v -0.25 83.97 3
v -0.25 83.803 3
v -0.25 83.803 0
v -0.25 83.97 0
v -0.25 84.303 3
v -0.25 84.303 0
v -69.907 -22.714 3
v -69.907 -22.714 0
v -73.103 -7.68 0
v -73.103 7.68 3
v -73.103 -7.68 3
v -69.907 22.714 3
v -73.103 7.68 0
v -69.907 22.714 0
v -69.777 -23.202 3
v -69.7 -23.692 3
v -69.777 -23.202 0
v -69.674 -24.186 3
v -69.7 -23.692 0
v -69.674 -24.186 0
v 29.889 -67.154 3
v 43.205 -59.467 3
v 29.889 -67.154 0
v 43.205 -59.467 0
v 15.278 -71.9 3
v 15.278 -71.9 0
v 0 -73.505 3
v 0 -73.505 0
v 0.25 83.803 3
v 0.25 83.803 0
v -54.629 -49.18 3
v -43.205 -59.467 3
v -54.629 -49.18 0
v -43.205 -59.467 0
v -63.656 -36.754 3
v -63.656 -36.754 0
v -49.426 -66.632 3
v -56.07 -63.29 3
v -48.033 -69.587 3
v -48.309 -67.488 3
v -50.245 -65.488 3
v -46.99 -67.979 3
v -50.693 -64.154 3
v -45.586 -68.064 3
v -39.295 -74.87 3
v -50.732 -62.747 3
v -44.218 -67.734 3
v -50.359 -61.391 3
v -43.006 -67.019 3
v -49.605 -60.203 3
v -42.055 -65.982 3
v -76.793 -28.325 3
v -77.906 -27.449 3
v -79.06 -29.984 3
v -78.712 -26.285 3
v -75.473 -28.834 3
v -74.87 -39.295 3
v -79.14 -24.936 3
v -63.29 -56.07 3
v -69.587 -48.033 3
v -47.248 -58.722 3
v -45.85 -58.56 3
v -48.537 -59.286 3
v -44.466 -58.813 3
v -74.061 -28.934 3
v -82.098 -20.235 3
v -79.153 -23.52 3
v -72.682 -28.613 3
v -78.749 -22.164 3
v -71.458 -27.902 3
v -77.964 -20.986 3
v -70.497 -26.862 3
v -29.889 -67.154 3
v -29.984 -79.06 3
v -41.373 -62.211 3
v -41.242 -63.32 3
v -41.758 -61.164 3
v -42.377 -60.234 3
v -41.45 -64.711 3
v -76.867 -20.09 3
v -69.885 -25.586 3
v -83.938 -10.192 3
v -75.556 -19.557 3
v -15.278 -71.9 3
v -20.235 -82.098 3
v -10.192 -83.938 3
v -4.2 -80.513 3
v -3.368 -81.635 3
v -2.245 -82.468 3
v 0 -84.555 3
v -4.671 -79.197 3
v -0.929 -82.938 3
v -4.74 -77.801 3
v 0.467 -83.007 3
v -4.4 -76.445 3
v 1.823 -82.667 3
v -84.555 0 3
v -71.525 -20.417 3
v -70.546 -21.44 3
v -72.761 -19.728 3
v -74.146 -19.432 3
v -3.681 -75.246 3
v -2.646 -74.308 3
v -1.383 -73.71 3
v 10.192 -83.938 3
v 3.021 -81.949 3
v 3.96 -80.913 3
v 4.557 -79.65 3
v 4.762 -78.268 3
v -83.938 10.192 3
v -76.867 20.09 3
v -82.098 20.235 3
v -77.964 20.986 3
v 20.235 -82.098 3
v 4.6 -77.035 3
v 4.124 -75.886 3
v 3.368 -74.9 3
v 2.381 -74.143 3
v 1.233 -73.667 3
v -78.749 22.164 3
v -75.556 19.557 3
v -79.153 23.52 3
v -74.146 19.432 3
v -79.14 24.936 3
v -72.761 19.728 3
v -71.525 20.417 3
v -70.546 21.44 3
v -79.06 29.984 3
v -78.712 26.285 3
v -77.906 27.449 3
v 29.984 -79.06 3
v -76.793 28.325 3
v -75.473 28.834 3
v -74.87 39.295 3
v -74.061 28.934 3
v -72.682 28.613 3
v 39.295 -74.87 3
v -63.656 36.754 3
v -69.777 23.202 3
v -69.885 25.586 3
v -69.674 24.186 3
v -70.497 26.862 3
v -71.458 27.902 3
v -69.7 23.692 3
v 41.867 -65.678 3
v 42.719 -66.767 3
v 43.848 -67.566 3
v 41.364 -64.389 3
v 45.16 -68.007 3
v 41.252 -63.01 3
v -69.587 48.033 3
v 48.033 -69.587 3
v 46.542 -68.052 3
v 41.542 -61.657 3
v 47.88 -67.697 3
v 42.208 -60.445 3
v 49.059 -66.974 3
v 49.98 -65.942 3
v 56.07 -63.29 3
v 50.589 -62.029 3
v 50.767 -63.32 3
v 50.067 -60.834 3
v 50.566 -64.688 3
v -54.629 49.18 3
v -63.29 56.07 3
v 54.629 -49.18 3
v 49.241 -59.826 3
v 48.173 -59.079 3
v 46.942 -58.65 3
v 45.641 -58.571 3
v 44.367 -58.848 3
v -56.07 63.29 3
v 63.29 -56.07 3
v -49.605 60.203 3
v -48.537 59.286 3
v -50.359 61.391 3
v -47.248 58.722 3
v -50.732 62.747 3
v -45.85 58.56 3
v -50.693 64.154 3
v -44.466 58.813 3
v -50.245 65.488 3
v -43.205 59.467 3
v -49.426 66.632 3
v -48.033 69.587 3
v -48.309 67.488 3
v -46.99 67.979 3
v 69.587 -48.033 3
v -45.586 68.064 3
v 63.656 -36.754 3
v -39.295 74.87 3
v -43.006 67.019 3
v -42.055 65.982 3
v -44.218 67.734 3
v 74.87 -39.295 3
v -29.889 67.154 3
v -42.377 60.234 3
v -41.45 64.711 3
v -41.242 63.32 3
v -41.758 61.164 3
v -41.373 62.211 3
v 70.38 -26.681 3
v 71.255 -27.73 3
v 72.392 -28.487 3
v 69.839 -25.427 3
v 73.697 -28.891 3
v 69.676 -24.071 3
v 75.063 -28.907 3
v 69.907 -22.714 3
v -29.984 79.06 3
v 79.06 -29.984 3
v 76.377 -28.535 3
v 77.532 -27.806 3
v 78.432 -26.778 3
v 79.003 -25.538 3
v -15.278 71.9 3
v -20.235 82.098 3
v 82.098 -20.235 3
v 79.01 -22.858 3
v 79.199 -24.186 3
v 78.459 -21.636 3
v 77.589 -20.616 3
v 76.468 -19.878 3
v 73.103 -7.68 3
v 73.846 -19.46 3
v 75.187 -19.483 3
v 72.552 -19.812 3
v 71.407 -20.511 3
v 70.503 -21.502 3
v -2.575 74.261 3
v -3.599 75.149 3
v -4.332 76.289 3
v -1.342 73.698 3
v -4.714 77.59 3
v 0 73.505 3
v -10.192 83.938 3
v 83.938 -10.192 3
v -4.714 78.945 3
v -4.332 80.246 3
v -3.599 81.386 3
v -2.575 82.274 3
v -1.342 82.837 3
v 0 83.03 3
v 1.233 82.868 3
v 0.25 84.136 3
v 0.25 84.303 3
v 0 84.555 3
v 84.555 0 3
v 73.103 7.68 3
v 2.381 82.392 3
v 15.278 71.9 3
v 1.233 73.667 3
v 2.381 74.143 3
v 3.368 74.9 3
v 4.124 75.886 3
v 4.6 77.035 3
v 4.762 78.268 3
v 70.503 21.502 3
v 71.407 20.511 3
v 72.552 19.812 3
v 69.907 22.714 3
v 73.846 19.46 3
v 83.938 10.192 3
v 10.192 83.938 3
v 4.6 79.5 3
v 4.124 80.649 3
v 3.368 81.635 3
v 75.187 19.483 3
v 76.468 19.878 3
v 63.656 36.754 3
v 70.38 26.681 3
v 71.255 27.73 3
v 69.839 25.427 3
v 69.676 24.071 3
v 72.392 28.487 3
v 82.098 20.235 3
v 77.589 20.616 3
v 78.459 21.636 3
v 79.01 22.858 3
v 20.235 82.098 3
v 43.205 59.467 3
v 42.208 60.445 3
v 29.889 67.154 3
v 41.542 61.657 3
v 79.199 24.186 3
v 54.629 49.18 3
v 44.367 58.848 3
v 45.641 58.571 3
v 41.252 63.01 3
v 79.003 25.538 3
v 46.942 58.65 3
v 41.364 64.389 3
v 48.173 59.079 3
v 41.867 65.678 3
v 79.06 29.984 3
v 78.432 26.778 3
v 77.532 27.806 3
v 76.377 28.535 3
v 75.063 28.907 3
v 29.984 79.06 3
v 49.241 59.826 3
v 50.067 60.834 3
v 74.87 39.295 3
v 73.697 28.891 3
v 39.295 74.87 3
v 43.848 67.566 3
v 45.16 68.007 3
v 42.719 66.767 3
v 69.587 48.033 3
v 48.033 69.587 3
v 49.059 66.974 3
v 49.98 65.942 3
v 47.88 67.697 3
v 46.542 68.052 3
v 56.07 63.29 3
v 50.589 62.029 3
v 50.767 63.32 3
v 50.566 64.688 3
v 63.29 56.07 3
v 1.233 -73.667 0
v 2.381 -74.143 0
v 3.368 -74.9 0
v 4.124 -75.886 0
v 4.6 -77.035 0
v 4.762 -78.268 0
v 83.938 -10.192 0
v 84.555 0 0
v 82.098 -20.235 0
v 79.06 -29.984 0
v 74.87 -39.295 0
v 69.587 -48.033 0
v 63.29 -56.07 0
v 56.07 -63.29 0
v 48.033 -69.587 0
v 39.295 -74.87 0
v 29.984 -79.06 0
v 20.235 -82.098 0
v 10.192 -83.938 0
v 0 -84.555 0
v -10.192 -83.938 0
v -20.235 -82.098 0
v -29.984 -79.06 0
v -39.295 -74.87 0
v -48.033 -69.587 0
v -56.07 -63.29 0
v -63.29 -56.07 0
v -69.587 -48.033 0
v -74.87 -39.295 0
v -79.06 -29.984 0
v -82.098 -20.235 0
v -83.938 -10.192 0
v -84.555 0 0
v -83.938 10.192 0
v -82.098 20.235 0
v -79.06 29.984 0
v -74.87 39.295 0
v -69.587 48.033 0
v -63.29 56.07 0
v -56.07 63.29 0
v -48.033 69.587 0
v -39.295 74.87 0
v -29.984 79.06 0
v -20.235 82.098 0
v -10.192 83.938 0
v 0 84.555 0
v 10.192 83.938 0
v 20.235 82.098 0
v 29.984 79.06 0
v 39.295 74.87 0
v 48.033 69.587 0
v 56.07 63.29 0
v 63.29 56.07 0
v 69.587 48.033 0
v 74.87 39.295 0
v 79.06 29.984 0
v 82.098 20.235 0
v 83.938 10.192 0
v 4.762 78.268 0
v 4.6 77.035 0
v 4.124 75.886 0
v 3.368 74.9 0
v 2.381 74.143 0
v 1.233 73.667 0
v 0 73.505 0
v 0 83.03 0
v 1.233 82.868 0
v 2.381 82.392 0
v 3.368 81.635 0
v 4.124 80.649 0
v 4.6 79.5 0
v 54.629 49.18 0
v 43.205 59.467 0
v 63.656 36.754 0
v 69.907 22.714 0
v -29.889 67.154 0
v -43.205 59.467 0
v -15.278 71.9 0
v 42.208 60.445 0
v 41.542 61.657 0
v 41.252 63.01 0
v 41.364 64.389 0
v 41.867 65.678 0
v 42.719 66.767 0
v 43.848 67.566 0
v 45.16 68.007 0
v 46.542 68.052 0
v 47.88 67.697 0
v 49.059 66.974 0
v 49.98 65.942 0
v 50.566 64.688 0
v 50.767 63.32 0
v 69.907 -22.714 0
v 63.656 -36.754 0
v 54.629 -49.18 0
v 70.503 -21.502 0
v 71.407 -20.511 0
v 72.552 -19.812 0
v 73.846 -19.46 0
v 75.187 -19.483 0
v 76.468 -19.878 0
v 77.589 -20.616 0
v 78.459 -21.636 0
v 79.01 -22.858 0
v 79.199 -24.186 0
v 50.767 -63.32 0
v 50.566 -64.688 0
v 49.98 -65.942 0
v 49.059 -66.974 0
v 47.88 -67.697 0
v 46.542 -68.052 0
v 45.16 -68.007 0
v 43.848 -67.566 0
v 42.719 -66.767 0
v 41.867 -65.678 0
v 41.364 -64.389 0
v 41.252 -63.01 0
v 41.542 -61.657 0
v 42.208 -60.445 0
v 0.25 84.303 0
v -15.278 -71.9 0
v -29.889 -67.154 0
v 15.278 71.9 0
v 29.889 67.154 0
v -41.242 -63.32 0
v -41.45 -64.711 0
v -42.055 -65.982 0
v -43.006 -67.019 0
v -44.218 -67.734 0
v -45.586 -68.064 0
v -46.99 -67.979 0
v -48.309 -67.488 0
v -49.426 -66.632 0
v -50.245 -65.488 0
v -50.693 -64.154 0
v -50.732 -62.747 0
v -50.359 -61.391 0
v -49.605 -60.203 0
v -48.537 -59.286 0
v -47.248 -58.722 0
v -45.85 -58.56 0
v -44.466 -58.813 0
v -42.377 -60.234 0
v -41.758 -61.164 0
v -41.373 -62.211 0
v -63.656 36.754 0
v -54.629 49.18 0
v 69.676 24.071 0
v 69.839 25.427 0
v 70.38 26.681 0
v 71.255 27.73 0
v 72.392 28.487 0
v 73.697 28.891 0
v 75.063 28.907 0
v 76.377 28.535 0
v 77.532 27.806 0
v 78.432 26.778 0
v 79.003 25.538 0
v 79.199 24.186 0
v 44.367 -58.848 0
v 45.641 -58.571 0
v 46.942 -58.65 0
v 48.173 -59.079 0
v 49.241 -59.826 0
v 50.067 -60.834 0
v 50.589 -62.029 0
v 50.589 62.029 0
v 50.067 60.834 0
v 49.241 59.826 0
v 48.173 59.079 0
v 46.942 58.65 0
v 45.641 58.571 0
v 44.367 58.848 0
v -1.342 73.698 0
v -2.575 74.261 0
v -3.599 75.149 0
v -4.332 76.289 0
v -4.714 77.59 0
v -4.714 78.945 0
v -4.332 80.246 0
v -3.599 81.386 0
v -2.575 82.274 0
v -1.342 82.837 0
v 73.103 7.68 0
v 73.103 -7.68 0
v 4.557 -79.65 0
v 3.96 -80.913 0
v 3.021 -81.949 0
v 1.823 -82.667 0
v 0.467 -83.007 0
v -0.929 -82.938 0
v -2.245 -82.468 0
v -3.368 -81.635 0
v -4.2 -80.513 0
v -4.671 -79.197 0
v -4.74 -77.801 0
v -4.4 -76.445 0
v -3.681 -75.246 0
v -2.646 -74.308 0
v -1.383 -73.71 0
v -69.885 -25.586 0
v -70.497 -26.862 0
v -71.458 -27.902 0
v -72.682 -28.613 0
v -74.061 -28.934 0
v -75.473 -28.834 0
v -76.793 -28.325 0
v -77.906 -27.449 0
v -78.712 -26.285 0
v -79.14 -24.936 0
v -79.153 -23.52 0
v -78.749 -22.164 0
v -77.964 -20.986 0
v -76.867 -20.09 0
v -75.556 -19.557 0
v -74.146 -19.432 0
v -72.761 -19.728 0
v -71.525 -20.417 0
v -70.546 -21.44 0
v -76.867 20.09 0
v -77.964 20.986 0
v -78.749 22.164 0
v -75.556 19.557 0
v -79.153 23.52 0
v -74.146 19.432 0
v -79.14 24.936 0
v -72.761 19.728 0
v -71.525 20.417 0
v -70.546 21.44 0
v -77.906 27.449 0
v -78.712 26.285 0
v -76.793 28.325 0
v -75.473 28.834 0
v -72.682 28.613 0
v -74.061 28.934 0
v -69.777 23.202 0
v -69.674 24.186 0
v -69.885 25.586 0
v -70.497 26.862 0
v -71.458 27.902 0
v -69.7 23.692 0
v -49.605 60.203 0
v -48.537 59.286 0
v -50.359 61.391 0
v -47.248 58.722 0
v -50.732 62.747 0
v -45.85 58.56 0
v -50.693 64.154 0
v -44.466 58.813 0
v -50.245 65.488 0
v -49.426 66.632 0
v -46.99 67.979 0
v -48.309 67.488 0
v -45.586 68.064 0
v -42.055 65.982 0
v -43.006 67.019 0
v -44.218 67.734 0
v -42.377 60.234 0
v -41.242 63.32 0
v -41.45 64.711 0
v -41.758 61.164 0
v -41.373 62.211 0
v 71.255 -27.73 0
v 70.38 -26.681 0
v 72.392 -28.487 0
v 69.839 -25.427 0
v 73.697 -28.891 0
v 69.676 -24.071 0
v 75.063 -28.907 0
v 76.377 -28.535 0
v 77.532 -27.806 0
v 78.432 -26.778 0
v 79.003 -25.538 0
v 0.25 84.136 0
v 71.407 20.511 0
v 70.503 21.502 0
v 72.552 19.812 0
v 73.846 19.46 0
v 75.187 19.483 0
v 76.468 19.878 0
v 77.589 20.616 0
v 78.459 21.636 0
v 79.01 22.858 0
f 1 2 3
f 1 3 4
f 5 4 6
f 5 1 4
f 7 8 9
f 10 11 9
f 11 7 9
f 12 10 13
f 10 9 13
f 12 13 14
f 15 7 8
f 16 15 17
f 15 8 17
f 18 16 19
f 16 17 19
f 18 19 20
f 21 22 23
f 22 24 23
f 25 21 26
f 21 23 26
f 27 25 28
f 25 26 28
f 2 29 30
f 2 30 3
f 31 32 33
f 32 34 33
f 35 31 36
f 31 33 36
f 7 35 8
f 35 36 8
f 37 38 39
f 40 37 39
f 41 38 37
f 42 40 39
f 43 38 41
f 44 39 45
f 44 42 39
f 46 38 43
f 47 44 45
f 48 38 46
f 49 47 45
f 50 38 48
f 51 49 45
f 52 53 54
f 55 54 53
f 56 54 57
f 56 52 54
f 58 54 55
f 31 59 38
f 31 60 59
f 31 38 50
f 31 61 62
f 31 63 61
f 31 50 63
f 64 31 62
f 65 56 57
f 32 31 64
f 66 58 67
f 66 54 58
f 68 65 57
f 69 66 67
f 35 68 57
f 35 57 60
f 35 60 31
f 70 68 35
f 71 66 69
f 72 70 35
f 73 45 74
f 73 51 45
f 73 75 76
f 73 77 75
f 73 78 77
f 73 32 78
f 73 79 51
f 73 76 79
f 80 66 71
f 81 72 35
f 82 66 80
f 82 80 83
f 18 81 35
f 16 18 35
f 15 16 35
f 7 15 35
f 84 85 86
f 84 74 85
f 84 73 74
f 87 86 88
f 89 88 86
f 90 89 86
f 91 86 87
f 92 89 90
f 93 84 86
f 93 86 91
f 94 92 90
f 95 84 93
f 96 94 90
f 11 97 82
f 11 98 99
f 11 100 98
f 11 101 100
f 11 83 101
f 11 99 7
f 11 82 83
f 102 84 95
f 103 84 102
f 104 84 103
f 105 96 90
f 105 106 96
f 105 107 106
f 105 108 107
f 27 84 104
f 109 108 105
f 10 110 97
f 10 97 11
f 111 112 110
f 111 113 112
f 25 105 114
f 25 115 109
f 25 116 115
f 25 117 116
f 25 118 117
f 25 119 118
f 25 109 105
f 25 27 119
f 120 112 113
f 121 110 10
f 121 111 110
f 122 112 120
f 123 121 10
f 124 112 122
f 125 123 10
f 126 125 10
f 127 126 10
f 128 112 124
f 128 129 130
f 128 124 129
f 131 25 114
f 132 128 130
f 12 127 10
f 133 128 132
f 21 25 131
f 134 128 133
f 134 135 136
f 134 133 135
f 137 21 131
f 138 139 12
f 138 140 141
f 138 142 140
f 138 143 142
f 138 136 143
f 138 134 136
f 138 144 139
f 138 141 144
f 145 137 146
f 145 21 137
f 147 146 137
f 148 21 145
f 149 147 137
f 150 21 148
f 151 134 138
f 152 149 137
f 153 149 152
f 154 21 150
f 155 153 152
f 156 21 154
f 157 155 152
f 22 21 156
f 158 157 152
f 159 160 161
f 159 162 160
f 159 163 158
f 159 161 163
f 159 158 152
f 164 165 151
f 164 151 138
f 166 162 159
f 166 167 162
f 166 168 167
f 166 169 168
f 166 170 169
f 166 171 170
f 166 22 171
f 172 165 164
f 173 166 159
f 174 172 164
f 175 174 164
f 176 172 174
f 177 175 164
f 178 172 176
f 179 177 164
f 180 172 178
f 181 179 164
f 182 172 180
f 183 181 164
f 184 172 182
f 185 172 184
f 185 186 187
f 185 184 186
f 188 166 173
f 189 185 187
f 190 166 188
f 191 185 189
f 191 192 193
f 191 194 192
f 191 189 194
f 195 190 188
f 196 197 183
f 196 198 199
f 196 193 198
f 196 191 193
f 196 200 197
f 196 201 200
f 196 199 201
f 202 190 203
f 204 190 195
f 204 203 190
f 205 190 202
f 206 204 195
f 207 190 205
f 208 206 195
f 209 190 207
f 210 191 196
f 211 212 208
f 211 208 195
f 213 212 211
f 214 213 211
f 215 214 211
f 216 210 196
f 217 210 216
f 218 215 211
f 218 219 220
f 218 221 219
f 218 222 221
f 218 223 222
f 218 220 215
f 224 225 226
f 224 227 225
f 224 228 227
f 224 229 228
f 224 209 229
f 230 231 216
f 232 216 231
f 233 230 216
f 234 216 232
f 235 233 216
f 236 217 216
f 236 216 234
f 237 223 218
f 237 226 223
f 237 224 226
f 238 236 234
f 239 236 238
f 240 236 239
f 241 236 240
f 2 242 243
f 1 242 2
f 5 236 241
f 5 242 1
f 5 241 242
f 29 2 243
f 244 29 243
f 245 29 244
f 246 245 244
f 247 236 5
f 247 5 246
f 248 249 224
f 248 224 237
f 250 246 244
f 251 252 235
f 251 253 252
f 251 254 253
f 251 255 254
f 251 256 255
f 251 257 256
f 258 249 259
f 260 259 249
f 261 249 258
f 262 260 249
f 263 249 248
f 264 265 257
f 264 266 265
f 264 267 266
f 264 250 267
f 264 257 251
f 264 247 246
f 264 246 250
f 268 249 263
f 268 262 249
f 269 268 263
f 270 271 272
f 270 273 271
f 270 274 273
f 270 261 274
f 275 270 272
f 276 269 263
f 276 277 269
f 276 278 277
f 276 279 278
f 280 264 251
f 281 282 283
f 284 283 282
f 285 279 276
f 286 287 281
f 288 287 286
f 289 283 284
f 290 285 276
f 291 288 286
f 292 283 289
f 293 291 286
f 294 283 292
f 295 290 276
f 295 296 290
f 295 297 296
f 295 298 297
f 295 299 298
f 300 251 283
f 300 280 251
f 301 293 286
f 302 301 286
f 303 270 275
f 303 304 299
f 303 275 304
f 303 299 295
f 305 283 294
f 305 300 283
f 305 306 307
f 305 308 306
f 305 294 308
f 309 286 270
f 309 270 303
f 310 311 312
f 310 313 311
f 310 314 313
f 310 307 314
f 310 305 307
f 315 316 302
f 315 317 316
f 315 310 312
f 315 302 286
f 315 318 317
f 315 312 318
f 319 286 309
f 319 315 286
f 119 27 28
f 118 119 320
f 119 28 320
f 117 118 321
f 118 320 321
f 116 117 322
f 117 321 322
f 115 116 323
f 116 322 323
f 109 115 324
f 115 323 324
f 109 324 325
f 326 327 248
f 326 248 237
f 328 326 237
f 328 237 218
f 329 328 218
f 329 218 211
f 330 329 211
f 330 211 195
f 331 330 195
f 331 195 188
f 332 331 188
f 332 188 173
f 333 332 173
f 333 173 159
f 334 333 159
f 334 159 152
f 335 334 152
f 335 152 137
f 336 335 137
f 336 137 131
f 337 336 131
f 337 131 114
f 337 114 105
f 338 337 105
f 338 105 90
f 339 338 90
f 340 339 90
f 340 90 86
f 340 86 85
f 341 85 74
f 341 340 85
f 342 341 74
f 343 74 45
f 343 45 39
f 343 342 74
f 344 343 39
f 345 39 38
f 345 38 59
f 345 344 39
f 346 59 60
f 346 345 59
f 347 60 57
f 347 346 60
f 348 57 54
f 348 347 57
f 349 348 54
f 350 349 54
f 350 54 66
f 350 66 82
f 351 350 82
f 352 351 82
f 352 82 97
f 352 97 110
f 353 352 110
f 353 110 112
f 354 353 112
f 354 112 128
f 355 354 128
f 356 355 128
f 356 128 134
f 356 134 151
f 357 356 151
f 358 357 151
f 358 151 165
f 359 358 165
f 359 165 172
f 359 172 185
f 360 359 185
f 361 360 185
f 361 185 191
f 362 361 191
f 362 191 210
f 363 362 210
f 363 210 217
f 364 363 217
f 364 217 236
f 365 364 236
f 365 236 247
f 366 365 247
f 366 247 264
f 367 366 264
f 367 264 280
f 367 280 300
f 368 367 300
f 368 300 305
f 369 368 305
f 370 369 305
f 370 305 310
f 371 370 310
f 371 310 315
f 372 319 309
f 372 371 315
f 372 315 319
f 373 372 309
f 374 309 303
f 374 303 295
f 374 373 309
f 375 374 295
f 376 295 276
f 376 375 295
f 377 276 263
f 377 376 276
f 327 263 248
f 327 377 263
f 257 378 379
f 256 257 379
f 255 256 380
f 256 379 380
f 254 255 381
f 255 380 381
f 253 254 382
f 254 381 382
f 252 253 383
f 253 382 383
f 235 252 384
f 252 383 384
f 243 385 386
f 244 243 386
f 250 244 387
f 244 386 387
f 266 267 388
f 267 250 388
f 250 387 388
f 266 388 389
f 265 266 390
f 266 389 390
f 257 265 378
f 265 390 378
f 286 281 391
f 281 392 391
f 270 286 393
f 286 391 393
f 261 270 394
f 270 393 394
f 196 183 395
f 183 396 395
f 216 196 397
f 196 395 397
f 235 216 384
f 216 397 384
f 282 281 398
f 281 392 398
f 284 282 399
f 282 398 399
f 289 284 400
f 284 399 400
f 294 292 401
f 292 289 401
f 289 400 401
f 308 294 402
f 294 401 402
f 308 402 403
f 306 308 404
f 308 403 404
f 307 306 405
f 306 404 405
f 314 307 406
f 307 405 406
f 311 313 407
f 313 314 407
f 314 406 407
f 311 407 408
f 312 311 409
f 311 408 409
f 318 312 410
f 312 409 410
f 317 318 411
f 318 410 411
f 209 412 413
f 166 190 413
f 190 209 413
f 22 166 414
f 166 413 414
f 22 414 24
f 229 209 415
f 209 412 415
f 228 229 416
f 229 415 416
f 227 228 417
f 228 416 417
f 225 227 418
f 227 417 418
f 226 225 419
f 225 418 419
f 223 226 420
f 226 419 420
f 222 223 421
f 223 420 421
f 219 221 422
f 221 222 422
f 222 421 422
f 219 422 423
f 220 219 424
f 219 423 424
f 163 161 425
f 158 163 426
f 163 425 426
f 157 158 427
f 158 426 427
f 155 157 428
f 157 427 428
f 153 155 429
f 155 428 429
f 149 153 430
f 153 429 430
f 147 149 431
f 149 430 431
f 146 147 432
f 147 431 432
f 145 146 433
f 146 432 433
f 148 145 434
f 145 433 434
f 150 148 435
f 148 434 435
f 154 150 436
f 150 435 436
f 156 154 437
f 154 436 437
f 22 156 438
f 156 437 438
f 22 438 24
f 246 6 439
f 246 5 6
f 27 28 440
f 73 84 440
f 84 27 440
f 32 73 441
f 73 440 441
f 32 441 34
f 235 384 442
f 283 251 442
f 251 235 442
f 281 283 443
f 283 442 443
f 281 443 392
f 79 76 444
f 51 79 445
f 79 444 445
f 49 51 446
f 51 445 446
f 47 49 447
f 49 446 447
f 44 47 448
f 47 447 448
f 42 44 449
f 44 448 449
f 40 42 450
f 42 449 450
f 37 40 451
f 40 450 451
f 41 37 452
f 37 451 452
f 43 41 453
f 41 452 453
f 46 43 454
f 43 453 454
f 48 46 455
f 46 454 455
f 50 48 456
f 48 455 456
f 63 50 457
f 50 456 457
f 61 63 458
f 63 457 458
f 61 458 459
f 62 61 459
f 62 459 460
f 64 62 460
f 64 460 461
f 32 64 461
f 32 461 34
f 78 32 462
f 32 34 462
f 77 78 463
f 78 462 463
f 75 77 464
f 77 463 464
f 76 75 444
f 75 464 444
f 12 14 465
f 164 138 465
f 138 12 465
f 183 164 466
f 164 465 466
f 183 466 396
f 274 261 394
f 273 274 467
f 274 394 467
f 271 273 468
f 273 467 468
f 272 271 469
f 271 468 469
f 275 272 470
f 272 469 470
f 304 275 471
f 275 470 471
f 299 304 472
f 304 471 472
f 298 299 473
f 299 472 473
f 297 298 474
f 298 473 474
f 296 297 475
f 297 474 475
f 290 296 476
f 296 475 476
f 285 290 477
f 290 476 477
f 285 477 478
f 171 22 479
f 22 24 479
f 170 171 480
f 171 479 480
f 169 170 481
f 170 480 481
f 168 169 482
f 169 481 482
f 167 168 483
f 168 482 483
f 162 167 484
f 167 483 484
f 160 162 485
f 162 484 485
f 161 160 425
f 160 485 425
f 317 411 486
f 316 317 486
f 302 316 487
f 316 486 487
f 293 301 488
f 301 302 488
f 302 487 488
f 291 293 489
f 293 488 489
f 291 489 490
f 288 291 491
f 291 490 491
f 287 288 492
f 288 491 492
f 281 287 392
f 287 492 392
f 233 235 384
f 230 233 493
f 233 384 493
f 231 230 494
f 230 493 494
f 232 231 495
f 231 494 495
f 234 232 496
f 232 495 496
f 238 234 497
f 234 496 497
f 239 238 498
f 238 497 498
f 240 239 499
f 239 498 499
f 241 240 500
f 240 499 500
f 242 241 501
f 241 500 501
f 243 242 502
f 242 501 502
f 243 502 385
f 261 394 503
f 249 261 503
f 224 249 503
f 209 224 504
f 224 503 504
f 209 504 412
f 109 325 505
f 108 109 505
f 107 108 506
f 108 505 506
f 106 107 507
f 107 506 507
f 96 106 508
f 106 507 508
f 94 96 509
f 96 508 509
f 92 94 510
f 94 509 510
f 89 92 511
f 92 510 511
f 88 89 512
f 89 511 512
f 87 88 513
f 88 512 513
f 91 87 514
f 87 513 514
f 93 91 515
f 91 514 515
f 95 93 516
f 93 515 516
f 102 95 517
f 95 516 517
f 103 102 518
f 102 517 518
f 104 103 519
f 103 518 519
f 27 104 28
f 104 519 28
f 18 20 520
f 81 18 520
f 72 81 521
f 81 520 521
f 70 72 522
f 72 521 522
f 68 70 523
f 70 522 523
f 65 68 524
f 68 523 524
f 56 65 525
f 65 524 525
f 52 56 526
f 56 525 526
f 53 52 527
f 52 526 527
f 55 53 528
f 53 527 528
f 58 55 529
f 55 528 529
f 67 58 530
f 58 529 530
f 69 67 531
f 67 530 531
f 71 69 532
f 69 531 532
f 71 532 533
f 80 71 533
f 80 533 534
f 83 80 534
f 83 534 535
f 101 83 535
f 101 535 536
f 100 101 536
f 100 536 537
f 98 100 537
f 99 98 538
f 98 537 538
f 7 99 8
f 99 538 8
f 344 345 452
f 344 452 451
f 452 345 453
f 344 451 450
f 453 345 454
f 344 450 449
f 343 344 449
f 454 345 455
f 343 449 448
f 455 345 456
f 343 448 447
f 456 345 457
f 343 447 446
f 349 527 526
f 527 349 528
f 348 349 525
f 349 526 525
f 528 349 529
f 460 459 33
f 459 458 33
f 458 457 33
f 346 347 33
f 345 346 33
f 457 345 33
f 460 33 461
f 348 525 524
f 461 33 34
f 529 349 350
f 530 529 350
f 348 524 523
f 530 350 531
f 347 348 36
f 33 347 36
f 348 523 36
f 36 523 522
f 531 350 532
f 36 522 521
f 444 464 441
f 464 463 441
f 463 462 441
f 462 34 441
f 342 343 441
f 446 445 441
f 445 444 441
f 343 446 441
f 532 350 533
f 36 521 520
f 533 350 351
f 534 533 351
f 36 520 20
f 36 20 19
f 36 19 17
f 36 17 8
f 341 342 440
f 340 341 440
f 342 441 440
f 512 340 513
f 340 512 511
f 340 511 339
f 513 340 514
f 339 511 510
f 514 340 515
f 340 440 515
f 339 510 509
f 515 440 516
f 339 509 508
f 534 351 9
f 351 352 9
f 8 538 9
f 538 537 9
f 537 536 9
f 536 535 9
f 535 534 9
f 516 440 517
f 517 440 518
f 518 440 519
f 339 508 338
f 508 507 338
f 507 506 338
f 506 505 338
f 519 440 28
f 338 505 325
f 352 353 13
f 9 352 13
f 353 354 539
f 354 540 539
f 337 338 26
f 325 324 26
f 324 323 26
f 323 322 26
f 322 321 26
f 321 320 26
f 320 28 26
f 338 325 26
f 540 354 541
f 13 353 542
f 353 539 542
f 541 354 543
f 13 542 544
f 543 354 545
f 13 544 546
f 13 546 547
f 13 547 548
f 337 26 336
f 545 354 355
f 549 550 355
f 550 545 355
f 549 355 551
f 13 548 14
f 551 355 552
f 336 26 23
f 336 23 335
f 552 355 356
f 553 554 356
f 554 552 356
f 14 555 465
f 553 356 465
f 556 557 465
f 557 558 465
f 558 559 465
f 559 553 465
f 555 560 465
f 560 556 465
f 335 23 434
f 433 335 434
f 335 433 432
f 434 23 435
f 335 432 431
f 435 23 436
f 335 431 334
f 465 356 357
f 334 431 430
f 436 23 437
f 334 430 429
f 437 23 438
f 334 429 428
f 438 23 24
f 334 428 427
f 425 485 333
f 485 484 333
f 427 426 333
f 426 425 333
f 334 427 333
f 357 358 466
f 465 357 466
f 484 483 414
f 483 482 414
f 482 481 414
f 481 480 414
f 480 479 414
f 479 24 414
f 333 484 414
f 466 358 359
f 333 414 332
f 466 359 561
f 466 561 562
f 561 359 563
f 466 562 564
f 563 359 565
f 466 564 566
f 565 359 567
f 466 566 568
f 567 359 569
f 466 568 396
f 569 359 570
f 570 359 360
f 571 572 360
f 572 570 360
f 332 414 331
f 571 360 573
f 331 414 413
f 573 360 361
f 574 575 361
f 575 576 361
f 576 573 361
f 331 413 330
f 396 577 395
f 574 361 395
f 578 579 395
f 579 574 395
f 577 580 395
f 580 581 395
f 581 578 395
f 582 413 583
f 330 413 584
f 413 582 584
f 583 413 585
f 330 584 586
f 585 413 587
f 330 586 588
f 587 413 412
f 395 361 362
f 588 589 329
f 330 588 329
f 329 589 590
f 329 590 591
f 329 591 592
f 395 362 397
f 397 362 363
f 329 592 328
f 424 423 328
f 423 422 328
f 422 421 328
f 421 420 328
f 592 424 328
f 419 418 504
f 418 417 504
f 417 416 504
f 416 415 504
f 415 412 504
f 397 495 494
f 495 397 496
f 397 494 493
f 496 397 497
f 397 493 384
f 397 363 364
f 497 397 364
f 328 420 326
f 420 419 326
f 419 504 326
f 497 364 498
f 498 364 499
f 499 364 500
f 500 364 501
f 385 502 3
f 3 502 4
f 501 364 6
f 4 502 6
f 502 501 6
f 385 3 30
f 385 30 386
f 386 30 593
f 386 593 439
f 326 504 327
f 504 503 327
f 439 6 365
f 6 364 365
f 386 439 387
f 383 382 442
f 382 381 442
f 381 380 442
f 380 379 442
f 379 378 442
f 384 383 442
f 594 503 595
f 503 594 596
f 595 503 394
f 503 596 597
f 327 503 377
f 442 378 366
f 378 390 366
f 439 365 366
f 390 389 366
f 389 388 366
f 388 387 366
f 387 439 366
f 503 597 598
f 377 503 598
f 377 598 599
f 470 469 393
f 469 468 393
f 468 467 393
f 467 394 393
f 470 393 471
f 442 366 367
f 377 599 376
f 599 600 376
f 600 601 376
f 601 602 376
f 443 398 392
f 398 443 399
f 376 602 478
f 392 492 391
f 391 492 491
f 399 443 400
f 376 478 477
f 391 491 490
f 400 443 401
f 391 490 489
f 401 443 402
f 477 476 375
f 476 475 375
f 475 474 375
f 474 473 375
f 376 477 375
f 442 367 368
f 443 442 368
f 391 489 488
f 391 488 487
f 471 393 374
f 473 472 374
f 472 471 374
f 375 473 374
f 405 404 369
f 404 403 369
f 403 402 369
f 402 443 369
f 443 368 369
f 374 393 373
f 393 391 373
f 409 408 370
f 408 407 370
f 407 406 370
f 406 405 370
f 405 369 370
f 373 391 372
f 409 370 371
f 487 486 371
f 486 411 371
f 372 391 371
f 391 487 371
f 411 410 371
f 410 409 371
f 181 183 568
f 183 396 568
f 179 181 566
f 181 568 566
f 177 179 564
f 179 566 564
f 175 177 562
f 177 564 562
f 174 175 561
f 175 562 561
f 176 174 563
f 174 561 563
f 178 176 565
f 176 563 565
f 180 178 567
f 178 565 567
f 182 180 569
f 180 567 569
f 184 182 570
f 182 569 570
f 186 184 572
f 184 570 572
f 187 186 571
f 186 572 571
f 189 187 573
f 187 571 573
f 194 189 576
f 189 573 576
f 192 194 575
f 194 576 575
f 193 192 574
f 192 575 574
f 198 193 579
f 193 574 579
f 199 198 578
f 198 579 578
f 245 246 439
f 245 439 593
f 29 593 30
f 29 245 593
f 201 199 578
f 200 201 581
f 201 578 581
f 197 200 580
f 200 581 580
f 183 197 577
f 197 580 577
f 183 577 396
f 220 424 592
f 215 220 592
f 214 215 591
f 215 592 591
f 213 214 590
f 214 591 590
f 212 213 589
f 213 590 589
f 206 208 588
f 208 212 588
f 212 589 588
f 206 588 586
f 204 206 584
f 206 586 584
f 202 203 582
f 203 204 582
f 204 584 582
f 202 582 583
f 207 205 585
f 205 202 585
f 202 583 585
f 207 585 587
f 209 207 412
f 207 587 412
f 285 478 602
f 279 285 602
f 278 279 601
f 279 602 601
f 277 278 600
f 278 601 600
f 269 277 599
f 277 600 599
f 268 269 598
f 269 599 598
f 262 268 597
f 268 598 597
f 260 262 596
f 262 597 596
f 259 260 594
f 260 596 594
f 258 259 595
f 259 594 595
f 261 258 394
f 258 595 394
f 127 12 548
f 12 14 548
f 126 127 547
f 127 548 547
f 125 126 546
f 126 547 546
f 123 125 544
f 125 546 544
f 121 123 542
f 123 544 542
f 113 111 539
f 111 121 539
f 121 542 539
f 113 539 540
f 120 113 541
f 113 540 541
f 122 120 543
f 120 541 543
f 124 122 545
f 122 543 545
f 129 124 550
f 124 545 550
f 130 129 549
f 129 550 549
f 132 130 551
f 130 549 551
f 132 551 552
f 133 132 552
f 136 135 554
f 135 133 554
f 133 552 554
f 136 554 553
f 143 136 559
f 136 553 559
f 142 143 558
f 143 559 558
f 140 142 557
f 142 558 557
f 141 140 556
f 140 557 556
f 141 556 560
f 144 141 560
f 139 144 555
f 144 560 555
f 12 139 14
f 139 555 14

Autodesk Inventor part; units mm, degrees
ref_plane "YZ Plane" through (0, 0, 0) normal (1, 0, 0) x (0, 1, 0)
ref_plane "XZ Plane" through (0, 0, 0) normal (0, 1, 0) x (-1, 0, 0)
ref_plane "XY Plane" through (0, 0, 0) normal (0, 0, 1) x (1, 0, 0)
sketch "Sketch1" plane through (0, 0, 0) normal (0, 0, 1) x (1, 0, 0)
  point P0 (0, 0)
sketch "Sketch2" plane through (0, 0, 0) normal (0, 0, 1) x (1, 0, 0)
  circle A0 centre (0, 0) radius 73.505
  circle A1 centre (0, 0) radius 84.555
  line L0 (0, 0) -> (0, 267.2238)
  line L1 (0, 73.505) -> (0, 78.2675)
  circle A2 centre (0, 78.2675) radius 4.7625
  circle A3 centre (-46.0045, 63.3197) radius 4.7625
  circle A4 centre (-74.4368, 24.186) radius 4.7625
  circle A5 centre (-74.4368, -24.186) radius 4.7625
  circle A6 centre (-46.0045, -63.3197) radius 4.7625
  circle A7 centre (0, -78.2675) radius 4.7625
  circle A8 centre (46.0045, -63.3197) radius 4.7625
  circle A9 centre (74.4368, -24.186) radius 4.7625
  circle A10 centre (74.4368, 24.186) radius 4.7625
  circle A11 centre (46.0045, 63.3197) radius 4.7625
  point P0 (0, 73.505)
  point P1 (43.2052, 59.4668)
  point P2 (69.9074, 22.7143)
  point P3 (69.9074, -22.7143)
  point P4 (43.2052, -59.4668)
  point P5 (0, -73.505)
  point P6 (-43.2052, -59.4668)
  point P7 (-69.9074, -22.7143)
  point P8 (-69.9074, 22.7143)
  point P9 (-43.2052, 59.4668)
  dimension "d0" = 147.01
  dimension "d1" = 169.11
  dimension "d3" = 4.7625
  dimension "d4" = 9.525
  dimension "d7" = 360
extrude "Extrusion1" add sketch "Sketch2" along normal blind 3
sketch "Sketch3" plane through (0, 0, 3) normal (0, 0, 1) x (1, 0, 0)
  circle A0 centre (0, 0) radius 84.555 projected
  line L0 (0, 84.555) -> (0, 84.055)
  line L1 (0.25, 83.8031) -> (-0.25, 83.8031)
  line L2 (-0.25, 83.8031) -> (-0.25, 84.3031)
  line L3 (-0.25, 84.3031) -> (0.25, 84.3031)
  line L4 (0.25, 84.3031) -> (0.25, 83.8031)
  line L5 (0.25, 83.8031) -> (-0.25, 84.3031) construction
  line L6 (-0.25, 83.8031) -> (0.25, 84.3031) construction
  point P0 (0, 84.0531)
  dimension "d11" = 0.5
  dimension "d15" = 0.5
  dimension "d16" = 0.5
extrude "Extrusion2" cut sketch "Sketch3" against normal blind 10 contours L1 L2 L3 L4
properties part number "bracket 1" material "Stainless Steel"
